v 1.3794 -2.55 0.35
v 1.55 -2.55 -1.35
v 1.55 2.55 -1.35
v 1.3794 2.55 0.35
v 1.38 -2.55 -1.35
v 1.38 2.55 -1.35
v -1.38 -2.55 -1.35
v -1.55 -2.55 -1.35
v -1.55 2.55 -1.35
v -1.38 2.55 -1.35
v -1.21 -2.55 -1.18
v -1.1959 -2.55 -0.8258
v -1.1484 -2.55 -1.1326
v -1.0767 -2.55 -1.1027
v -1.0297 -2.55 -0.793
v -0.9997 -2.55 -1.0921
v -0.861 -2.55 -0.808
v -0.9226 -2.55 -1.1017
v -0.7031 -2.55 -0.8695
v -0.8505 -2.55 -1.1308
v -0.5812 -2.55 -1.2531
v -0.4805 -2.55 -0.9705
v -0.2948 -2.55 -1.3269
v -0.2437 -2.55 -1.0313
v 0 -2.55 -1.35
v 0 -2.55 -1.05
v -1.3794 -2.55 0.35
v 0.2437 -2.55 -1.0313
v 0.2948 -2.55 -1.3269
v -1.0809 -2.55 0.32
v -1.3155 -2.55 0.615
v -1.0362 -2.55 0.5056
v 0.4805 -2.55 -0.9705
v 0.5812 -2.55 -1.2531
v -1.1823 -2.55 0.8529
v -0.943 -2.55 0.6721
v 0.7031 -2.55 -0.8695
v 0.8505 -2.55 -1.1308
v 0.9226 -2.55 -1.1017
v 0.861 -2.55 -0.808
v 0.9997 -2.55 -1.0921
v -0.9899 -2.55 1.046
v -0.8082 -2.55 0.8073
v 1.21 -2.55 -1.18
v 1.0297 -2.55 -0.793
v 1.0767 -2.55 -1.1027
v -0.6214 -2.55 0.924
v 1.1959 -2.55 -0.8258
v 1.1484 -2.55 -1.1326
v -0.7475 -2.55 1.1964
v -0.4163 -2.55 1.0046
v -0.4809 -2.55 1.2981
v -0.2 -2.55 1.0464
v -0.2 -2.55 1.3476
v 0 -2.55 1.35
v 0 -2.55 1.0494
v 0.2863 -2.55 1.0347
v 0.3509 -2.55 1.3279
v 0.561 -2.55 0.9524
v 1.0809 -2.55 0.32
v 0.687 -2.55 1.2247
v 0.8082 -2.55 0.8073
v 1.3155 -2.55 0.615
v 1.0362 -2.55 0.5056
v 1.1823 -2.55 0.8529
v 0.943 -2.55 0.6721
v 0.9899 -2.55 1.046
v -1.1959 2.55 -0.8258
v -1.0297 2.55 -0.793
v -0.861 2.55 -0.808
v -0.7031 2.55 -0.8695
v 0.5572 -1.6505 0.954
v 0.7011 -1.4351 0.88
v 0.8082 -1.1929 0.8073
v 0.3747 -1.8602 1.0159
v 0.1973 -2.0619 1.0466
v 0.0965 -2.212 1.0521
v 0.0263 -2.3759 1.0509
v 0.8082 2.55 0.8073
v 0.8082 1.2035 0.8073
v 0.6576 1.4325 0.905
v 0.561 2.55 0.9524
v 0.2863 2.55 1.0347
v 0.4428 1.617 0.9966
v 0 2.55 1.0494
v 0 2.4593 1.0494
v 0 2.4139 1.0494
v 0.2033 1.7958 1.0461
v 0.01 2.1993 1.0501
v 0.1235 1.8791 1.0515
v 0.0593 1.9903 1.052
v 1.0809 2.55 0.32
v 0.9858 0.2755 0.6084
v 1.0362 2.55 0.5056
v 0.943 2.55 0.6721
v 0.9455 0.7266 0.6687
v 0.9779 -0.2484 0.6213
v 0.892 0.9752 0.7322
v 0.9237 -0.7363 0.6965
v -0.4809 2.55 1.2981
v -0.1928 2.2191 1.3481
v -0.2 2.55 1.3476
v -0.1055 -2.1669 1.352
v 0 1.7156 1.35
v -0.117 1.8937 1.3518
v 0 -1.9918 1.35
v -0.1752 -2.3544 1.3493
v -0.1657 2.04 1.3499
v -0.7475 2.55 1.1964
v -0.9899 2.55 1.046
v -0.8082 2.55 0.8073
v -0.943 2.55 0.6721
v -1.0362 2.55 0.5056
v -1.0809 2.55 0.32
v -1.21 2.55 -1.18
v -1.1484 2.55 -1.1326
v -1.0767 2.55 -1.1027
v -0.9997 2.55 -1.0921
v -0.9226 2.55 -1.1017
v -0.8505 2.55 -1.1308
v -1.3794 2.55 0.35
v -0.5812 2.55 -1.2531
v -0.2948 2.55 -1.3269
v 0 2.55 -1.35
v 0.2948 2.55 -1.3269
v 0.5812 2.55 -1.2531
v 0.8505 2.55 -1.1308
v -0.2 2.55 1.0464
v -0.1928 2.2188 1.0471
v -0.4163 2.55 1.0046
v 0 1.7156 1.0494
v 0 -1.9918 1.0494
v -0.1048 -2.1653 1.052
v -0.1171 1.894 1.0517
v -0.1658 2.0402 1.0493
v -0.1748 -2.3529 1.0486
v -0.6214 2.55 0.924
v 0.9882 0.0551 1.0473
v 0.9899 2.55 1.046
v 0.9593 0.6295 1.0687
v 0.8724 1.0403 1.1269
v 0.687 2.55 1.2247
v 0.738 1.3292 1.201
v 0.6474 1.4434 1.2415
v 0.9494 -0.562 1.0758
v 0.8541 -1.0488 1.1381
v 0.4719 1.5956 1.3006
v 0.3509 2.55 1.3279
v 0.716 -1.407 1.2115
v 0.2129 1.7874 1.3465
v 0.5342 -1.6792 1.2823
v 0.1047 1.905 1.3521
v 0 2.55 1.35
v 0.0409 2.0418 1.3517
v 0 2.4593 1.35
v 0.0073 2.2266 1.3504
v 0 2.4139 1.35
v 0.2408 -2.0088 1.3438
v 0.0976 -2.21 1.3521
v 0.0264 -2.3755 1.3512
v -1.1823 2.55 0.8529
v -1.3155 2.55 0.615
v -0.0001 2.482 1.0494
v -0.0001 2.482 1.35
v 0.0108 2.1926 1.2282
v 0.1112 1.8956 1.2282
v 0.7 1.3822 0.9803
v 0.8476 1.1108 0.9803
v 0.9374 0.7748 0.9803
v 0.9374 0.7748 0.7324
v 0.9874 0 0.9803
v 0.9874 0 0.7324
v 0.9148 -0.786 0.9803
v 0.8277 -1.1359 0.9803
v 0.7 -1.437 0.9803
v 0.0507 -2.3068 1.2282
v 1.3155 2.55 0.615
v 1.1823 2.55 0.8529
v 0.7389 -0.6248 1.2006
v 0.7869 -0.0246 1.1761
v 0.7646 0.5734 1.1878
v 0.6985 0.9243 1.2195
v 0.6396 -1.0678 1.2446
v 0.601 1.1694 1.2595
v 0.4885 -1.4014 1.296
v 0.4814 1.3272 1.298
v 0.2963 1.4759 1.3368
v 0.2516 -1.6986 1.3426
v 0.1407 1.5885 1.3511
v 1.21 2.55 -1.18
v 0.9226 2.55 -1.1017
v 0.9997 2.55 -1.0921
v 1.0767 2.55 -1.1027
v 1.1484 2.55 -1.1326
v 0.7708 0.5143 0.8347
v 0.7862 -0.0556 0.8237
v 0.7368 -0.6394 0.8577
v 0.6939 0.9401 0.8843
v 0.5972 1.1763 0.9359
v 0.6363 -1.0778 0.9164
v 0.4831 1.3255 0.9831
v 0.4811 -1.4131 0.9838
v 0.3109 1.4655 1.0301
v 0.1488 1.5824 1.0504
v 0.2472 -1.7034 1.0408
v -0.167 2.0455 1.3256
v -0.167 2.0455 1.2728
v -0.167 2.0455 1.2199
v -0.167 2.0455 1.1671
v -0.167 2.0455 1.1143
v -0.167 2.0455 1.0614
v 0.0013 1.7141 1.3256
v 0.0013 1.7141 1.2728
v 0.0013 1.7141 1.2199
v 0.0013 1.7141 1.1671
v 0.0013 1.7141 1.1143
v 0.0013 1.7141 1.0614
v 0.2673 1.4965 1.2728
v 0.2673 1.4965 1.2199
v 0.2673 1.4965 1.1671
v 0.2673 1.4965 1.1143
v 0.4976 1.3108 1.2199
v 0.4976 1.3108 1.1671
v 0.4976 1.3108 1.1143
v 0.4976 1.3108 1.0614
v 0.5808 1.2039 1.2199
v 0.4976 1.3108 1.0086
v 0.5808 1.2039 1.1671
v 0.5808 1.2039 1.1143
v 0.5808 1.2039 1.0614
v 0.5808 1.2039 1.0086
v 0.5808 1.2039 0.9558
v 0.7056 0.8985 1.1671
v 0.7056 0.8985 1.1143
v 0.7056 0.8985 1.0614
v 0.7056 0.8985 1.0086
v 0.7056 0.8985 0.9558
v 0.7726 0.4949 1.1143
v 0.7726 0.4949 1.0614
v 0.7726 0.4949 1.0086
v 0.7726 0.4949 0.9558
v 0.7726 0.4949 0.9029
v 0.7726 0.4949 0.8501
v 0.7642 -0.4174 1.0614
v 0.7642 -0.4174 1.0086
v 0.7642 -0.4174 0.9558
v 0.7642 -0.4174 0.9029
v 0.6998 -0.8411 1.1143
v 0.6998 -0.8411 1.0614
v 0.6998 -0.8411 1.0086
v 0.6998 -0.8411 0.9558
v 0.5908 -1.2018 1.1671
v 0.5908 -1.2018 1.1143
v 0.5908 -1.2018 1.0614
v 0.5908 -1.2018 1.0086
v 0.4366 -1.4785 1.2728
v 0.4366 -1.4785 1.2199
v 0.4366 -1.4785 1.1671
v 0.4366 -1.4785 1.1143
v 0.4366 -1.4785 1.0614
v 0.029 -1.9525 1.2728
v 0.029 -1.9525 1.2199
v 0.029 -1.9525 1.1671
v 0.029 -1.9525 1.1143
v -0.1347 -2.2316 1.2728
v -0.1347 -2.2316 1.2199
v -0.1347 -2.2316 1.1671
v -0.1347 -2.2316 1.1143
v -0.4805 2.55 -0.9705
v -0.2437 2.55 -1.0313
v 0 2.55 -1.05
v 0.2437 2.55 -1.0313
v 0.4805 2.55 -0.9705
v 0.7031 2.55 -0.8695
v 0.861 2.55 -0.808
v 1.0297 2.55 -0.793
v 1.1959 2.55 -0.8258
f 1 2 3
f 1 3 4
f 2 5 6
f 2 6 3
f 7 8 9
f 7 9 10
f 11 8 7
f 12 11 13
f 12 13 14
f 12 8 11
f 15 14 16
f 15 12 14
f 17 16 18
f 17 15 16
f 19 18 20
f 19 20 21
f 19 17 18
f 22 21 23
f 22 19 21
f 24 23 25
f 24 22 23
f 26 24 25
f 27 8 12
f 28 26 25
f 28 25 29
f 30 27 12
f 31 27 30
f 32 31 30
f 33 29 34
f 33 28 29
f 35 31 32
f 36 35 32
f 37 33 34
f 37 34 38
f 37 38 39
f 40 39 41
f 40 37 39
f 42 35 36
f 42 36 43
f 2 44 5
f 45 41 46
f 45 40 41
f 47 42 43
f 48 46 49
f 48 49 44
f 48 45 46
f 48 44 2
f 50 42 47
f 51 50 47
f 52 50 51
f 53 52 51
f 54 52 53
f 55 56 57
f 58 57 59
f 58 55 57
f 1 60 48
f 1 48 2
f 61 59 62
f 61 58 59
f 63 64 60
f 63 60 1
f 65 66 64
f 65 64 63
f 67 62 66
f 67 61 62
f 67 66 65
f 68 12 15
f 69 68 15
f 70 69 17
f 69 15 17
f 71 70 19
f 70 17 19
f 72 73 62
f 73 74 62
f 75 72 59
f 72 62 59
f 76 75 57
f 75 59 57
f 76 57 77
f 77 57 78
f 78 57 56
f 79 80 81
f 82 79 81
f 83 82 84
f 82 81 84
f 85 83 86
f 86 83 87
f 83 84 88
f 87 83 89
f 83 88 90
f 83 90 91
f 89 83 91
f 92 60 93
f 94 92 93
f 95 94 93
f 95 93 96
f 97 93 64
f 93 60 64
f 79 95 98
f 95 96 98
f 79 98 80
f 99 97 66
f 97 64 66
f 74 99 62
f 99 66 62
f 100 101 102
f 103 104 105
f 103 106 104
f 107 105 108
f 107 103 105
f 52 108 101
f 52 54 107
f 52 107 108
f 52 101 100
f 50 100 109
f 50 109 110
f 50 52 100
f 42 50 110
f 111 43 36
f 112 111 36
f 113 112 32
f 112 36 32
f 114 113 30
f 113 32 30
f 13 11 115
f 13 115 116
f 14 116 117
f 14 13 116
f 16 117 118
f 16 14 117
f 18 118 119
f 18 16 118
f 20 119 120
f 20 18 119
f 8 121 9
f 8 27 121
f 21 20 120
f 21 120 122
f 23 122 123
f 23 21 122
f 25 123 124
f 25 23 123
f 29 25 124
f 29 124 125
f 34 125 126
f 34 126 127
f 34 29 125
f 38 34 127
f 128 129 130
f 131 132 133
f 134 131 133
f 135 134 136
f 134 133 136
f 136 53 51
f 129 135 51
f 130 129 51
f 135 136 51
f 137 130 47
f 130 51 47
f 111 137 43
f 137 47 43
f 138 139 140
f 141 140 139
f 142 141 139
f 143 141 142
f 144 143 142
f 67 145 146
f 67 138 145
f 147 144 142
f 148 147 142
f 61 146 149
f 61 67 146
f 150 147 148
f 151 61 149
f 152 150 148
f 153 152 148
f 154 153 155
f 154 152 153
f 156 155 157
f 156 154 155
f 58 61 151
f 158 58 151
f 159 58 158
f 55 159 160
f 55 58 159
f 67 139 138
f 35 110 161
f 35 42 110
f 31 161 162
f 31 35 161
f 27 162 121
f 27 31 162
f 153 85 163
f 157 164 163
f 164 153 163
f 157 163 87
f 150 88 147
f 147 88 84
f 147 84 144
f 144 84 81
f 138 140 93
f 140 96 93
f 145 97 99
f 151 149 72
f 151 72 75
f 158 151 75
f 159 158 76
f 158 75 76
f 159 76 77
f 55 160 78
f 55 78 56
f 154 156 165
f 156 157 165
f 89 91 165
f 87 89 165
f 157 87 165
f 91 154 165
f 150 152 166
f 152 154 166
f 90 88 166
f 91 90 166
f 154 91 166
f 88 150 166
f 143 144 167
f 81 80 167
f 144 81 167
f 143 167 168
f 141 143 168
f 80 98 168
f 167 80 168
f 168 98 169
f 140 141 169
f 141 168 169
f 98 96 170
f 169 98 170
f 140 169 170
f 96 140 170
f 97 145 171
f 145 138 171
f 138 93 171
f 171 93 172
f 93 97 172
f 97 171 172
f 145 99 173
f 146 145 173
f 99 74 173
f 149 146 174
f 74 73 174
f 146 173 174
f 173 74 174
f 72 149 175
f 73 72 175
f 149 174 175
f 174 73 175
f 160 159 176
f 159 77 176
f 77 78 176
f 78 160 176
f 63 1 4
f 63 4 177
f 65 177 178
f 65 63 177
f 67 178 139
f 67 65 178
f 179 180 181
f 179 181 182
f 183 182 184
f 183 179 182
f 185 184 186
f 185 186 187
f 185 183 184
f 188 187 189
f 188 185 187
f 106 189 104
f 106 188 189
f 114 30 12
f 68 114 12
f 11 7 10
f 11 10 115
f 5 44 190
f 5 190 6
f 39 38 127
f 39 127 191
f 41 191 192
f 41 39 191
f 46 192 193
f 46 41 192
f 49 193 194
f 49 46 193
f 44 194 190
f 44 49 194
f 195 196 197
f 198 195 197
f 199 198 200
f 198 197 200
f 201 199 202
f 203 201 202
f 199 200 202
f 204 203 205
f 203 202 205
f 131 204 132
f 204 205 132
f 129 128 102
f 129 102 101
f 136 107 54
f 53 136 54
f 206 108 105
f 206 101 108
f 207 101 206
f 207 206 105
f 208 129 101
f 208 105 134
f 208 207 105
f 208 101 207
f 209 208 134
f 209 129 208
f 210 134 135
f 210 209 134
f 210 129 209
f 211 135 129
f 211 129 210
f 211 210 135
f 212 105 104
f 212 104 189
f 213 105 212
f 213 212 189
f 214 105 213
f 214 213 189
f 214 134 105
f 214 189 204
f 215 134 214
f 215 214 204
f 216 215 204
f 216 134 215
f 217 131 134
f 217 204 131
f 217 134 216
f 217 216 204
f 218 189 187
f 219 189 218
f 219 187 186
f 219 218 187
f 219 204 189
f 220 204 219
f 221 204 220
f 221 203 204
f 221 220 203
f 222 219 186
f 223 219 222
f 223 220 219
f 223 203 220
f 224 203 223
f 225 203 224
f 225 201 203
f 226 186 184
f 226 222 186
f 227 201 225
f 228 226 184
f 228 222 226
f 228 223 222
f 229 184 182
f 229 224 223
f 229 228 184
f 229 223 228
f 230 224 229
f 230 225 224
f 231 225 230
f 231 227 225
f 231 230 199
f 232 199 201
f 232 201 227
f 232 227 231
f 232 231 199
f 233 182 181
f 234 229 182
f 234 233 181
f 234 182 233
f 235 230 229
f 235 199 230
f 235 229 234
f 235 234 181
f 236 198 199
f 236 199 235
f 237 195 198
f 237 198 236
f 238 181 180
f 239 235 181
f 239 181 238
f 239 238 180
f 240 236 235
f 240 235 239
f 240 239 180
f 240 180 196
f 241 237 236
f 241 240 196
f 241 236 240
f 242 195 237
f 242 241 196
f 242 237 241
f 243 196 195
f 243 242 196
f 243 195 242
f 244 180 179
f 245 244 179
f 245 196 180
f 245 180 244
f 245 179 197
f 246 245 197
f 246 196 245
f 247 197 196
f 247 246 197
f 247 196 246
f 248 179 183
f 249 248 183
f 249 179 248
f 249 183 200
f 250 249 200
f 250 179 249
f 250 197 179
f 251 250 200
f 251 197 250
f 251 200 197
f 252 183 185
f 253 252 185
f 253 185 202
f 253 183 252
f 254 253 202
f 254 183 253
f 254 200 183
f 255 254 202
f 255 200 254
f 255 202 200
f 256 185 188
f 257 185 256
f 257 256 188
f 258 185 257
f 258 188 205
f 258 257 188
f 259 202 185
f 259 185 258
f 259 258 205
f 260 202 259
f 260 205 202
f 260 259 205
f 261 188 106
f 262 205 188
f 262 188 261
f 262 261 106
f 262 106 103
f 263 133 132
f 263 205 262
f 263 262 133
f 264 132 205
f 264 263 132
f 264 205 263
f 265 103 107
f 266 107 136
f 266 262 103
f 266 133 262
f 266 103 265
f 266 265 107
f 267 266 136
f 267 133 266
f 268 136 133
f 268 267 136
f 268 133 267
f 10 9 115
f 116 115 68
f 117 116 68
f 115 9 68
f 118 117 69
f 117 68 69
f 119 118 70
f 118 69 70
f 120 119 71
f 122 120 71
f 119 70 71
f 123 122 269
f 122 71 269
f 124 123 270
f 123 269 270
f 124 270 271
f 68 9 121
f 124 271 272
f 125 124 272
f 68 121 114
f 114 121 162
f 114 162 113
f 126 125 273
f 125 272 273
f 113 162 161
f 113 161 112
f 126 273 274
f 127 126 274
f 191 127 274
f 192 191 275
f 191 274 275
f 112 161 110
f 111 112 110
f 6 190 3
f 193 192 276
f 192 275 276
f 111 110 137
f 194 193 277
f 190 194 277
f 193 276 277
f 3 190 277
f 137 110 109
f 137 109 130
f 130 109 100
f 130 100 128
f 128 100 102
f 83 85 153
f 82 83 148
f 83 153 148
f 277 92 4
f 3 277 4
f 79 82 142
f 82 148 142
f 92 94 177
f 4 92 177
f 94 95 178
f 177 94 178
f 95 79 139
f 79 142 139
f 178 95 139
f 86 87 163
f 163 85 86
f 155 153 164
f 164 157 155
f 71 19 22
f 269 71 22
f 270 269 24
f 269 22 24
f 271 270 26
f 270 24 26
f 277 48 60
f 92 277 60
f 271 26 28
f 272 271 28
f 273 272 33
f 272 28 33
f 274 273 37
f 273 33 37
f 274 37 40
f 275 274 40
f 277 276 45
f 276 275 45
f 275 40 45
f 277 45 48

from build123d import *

# Parameters (mm, degrees)
F1_DEPTH = 2.55
F3_DEPTH = 25
F5_DEPTH = 25


# Not quite as in the source:
# - the dataset's text gives a spline's control points without its knots; the knots are read off the source's solid


with BuildPart() as f1:
    # F0 (on Front) → F1 (new body, symmetric)
    with BuildSketch(Plane.XZ):
        with BuildLine():
            Line((-1.3794310575, 0.35), (-1.55, -1.35))
            Line((-1.55, -1.35), (-1.38, -1.35))
            Line((-1.38, -1.35), (-1.21, -1.18))
            ThreePointArc((-1.21, -1.18), (-1.0385273379, -1.0949001124), (-0.8504995958, -1.1308227089))
            ThreePointArc((-0.8504995958, -1.1308227089), (-0.4396486045, -1.2962847488), (0, -1.35))
            ThreePointArc((0, -1.35), (0.4396486045, -1.2962847488), (0.8504995958, -1.1308227089))
            ThreePointArc((0.8504995958, -1.1308227089), (1.0385273379, -1.0949001124), (1.21, -1.18))
            Line((1.21, -1.18), (1.38, -1.35))
            Line((1.38, -1.35), (1.55, -1.35))
            Line((1.55, -1.35), (1.3794310575, 0.35))
            ThreePointArc((1.3794310575, 0.35), (1.2570591939, 0.7385443736), (0.9898813272, 1.0460465537))
            ThreePointArc((0.9898813272, 1.0460465537), (0.5220007527, 1.2861495252), (0, 1.35))
            ThreePointArc((0, 1.35), (-0.5220007527, 1.2861495252), (-0.9898813272, 1.0460465537))
            ThreePointArc((-0.9898813272, 1.0460465537), (-1.2570591939, 0.7385443736), (-1.3794310575, 0.35))
        make_face()
    extrude(amount=F1_DEPTH, both=True)

    # F2 (on face) → F3 (cut)
    with BuildSketch(Plane.XZ.offset(2.55)):
        with BuildLine():
            ThreePointArc((-1.1958934952, -0.825752383), (-0.9447923506, -0.7944841457), (-0.7031312179, -0.8695133691))
            ThreePointArc((-0.7031312179, -0.8695133691), (-0.3634662432, -1.0061149648), (0, -1.0499850117))
            ThreePointArc((0, -1.0499850117), (0.3634662432, -1.0061149648), (0.7031312179, -0.8695133691))
            ThreePointArc((0.7031312179, -0.8695133691), (0.9447923506, -0.7944841457), (1.1958934952, -0.825752383))
            Line((1.1958934952, -0.825752383), (1.0809297915, 0.3200499734))
            ThreePointArc((1.0809297915, 0.3200499734), (0.995269489, 0.5920310285), (0.8082449867, 0.8072825495))
            ThreePointArc((0.8082449867, 0.8072825495), (0.4261075642, 1.0017409157), (0, 1.0494421693))
            ThreePointArc((0, 1.0494421693), (-0.4261075642, 1.0017409157), (-0.8082449867, 0.8072825495))
            ThreePointArc((-0.8082449867, 0.8072825495), (-0.995269489, 0.5920310285), (-1.0809297915, 0.3200499734))
            Line((-1.0809297915, 0.3200499734), (-1.1958934952, -0.825752383))
        make_face()
    extrude(amount=-F3_DEPTH, mode=Mode.SUBTRACT)

    # F4 (on Top) → F5 (cut)
    with BuildSketch(Plane.XY):
        with BuildLine():
            add(Edge.make_bspline(
                [(0, 2.55), (0, 2.3012170484), (-0.0174660225, 1.8063678705), (0.8981223952, 1.4759598818), (1.0546660634, -0.0192739265), (0.8408673454, -1.4725471105), (0.1636337962, -2.021288105), (0, -2.3857110462), (0, -2.55)],
                knots=[0, 0, 0, 0, 0.1425106556, 0.297117234, 0.5049568696, 0.7167103753, 0.8747727514, 1, 1, 1, 1], degree=3))
            Line((0, 2.55), (-0.199999971, 2.55))
            add(Edge.make_bspline(
                [(-0.199999971, 2.55), (-0.199999971, 2.442861913), (-0.2033495667, 2.2756171701), (-0.1723667571, 2.0458653132), (-0.1168215656, 1.8712862158), (-0.0022501698, 1.7056297023), (0.1335578991, 1.590875413), (0.2688325655, 1.4955434762), (0.39494662, 1.4058304378), (0.5020185664, 1.3121894563), (0.6095184956, 1.1758498184), (0.7160601321, 0.9149098947), (0.781329804, 0.5035285403), (0.7939401967, 0.0406520803), (0.7709571004, -0.4234581557), (0.7074148963, -0.8510847156), (0.598032004, -1.2186029446), (0.4450309549, -1.4850813091), (0.2412797275, -1.7118129344), (0.0210326126, -1.9446414735), (-0.1511521088, -2.2249054182), (-0.199999971, -2.4387055988), (-0.199999971, -2.55)],
                knots=[0, 0, 0, 0, 0.0625, 0.09375, 0.125, 0.15625, 0.1875, 0.21875, 0.25, 0.28125, 0.3125, 0.375, 0.4375, 0.5, 0.5625, 0.625, 0.6875, 0.75, 0.8125, 0.875, 0.9375, 1, 1, 1, 1], degree=3))
            Line((-0.199999971, -2.55), (0, -2.55))
        make_face()
    extrude(amount=F5_DEPTH, mode=Mode.SUBTRACT)


solid = f1.part
